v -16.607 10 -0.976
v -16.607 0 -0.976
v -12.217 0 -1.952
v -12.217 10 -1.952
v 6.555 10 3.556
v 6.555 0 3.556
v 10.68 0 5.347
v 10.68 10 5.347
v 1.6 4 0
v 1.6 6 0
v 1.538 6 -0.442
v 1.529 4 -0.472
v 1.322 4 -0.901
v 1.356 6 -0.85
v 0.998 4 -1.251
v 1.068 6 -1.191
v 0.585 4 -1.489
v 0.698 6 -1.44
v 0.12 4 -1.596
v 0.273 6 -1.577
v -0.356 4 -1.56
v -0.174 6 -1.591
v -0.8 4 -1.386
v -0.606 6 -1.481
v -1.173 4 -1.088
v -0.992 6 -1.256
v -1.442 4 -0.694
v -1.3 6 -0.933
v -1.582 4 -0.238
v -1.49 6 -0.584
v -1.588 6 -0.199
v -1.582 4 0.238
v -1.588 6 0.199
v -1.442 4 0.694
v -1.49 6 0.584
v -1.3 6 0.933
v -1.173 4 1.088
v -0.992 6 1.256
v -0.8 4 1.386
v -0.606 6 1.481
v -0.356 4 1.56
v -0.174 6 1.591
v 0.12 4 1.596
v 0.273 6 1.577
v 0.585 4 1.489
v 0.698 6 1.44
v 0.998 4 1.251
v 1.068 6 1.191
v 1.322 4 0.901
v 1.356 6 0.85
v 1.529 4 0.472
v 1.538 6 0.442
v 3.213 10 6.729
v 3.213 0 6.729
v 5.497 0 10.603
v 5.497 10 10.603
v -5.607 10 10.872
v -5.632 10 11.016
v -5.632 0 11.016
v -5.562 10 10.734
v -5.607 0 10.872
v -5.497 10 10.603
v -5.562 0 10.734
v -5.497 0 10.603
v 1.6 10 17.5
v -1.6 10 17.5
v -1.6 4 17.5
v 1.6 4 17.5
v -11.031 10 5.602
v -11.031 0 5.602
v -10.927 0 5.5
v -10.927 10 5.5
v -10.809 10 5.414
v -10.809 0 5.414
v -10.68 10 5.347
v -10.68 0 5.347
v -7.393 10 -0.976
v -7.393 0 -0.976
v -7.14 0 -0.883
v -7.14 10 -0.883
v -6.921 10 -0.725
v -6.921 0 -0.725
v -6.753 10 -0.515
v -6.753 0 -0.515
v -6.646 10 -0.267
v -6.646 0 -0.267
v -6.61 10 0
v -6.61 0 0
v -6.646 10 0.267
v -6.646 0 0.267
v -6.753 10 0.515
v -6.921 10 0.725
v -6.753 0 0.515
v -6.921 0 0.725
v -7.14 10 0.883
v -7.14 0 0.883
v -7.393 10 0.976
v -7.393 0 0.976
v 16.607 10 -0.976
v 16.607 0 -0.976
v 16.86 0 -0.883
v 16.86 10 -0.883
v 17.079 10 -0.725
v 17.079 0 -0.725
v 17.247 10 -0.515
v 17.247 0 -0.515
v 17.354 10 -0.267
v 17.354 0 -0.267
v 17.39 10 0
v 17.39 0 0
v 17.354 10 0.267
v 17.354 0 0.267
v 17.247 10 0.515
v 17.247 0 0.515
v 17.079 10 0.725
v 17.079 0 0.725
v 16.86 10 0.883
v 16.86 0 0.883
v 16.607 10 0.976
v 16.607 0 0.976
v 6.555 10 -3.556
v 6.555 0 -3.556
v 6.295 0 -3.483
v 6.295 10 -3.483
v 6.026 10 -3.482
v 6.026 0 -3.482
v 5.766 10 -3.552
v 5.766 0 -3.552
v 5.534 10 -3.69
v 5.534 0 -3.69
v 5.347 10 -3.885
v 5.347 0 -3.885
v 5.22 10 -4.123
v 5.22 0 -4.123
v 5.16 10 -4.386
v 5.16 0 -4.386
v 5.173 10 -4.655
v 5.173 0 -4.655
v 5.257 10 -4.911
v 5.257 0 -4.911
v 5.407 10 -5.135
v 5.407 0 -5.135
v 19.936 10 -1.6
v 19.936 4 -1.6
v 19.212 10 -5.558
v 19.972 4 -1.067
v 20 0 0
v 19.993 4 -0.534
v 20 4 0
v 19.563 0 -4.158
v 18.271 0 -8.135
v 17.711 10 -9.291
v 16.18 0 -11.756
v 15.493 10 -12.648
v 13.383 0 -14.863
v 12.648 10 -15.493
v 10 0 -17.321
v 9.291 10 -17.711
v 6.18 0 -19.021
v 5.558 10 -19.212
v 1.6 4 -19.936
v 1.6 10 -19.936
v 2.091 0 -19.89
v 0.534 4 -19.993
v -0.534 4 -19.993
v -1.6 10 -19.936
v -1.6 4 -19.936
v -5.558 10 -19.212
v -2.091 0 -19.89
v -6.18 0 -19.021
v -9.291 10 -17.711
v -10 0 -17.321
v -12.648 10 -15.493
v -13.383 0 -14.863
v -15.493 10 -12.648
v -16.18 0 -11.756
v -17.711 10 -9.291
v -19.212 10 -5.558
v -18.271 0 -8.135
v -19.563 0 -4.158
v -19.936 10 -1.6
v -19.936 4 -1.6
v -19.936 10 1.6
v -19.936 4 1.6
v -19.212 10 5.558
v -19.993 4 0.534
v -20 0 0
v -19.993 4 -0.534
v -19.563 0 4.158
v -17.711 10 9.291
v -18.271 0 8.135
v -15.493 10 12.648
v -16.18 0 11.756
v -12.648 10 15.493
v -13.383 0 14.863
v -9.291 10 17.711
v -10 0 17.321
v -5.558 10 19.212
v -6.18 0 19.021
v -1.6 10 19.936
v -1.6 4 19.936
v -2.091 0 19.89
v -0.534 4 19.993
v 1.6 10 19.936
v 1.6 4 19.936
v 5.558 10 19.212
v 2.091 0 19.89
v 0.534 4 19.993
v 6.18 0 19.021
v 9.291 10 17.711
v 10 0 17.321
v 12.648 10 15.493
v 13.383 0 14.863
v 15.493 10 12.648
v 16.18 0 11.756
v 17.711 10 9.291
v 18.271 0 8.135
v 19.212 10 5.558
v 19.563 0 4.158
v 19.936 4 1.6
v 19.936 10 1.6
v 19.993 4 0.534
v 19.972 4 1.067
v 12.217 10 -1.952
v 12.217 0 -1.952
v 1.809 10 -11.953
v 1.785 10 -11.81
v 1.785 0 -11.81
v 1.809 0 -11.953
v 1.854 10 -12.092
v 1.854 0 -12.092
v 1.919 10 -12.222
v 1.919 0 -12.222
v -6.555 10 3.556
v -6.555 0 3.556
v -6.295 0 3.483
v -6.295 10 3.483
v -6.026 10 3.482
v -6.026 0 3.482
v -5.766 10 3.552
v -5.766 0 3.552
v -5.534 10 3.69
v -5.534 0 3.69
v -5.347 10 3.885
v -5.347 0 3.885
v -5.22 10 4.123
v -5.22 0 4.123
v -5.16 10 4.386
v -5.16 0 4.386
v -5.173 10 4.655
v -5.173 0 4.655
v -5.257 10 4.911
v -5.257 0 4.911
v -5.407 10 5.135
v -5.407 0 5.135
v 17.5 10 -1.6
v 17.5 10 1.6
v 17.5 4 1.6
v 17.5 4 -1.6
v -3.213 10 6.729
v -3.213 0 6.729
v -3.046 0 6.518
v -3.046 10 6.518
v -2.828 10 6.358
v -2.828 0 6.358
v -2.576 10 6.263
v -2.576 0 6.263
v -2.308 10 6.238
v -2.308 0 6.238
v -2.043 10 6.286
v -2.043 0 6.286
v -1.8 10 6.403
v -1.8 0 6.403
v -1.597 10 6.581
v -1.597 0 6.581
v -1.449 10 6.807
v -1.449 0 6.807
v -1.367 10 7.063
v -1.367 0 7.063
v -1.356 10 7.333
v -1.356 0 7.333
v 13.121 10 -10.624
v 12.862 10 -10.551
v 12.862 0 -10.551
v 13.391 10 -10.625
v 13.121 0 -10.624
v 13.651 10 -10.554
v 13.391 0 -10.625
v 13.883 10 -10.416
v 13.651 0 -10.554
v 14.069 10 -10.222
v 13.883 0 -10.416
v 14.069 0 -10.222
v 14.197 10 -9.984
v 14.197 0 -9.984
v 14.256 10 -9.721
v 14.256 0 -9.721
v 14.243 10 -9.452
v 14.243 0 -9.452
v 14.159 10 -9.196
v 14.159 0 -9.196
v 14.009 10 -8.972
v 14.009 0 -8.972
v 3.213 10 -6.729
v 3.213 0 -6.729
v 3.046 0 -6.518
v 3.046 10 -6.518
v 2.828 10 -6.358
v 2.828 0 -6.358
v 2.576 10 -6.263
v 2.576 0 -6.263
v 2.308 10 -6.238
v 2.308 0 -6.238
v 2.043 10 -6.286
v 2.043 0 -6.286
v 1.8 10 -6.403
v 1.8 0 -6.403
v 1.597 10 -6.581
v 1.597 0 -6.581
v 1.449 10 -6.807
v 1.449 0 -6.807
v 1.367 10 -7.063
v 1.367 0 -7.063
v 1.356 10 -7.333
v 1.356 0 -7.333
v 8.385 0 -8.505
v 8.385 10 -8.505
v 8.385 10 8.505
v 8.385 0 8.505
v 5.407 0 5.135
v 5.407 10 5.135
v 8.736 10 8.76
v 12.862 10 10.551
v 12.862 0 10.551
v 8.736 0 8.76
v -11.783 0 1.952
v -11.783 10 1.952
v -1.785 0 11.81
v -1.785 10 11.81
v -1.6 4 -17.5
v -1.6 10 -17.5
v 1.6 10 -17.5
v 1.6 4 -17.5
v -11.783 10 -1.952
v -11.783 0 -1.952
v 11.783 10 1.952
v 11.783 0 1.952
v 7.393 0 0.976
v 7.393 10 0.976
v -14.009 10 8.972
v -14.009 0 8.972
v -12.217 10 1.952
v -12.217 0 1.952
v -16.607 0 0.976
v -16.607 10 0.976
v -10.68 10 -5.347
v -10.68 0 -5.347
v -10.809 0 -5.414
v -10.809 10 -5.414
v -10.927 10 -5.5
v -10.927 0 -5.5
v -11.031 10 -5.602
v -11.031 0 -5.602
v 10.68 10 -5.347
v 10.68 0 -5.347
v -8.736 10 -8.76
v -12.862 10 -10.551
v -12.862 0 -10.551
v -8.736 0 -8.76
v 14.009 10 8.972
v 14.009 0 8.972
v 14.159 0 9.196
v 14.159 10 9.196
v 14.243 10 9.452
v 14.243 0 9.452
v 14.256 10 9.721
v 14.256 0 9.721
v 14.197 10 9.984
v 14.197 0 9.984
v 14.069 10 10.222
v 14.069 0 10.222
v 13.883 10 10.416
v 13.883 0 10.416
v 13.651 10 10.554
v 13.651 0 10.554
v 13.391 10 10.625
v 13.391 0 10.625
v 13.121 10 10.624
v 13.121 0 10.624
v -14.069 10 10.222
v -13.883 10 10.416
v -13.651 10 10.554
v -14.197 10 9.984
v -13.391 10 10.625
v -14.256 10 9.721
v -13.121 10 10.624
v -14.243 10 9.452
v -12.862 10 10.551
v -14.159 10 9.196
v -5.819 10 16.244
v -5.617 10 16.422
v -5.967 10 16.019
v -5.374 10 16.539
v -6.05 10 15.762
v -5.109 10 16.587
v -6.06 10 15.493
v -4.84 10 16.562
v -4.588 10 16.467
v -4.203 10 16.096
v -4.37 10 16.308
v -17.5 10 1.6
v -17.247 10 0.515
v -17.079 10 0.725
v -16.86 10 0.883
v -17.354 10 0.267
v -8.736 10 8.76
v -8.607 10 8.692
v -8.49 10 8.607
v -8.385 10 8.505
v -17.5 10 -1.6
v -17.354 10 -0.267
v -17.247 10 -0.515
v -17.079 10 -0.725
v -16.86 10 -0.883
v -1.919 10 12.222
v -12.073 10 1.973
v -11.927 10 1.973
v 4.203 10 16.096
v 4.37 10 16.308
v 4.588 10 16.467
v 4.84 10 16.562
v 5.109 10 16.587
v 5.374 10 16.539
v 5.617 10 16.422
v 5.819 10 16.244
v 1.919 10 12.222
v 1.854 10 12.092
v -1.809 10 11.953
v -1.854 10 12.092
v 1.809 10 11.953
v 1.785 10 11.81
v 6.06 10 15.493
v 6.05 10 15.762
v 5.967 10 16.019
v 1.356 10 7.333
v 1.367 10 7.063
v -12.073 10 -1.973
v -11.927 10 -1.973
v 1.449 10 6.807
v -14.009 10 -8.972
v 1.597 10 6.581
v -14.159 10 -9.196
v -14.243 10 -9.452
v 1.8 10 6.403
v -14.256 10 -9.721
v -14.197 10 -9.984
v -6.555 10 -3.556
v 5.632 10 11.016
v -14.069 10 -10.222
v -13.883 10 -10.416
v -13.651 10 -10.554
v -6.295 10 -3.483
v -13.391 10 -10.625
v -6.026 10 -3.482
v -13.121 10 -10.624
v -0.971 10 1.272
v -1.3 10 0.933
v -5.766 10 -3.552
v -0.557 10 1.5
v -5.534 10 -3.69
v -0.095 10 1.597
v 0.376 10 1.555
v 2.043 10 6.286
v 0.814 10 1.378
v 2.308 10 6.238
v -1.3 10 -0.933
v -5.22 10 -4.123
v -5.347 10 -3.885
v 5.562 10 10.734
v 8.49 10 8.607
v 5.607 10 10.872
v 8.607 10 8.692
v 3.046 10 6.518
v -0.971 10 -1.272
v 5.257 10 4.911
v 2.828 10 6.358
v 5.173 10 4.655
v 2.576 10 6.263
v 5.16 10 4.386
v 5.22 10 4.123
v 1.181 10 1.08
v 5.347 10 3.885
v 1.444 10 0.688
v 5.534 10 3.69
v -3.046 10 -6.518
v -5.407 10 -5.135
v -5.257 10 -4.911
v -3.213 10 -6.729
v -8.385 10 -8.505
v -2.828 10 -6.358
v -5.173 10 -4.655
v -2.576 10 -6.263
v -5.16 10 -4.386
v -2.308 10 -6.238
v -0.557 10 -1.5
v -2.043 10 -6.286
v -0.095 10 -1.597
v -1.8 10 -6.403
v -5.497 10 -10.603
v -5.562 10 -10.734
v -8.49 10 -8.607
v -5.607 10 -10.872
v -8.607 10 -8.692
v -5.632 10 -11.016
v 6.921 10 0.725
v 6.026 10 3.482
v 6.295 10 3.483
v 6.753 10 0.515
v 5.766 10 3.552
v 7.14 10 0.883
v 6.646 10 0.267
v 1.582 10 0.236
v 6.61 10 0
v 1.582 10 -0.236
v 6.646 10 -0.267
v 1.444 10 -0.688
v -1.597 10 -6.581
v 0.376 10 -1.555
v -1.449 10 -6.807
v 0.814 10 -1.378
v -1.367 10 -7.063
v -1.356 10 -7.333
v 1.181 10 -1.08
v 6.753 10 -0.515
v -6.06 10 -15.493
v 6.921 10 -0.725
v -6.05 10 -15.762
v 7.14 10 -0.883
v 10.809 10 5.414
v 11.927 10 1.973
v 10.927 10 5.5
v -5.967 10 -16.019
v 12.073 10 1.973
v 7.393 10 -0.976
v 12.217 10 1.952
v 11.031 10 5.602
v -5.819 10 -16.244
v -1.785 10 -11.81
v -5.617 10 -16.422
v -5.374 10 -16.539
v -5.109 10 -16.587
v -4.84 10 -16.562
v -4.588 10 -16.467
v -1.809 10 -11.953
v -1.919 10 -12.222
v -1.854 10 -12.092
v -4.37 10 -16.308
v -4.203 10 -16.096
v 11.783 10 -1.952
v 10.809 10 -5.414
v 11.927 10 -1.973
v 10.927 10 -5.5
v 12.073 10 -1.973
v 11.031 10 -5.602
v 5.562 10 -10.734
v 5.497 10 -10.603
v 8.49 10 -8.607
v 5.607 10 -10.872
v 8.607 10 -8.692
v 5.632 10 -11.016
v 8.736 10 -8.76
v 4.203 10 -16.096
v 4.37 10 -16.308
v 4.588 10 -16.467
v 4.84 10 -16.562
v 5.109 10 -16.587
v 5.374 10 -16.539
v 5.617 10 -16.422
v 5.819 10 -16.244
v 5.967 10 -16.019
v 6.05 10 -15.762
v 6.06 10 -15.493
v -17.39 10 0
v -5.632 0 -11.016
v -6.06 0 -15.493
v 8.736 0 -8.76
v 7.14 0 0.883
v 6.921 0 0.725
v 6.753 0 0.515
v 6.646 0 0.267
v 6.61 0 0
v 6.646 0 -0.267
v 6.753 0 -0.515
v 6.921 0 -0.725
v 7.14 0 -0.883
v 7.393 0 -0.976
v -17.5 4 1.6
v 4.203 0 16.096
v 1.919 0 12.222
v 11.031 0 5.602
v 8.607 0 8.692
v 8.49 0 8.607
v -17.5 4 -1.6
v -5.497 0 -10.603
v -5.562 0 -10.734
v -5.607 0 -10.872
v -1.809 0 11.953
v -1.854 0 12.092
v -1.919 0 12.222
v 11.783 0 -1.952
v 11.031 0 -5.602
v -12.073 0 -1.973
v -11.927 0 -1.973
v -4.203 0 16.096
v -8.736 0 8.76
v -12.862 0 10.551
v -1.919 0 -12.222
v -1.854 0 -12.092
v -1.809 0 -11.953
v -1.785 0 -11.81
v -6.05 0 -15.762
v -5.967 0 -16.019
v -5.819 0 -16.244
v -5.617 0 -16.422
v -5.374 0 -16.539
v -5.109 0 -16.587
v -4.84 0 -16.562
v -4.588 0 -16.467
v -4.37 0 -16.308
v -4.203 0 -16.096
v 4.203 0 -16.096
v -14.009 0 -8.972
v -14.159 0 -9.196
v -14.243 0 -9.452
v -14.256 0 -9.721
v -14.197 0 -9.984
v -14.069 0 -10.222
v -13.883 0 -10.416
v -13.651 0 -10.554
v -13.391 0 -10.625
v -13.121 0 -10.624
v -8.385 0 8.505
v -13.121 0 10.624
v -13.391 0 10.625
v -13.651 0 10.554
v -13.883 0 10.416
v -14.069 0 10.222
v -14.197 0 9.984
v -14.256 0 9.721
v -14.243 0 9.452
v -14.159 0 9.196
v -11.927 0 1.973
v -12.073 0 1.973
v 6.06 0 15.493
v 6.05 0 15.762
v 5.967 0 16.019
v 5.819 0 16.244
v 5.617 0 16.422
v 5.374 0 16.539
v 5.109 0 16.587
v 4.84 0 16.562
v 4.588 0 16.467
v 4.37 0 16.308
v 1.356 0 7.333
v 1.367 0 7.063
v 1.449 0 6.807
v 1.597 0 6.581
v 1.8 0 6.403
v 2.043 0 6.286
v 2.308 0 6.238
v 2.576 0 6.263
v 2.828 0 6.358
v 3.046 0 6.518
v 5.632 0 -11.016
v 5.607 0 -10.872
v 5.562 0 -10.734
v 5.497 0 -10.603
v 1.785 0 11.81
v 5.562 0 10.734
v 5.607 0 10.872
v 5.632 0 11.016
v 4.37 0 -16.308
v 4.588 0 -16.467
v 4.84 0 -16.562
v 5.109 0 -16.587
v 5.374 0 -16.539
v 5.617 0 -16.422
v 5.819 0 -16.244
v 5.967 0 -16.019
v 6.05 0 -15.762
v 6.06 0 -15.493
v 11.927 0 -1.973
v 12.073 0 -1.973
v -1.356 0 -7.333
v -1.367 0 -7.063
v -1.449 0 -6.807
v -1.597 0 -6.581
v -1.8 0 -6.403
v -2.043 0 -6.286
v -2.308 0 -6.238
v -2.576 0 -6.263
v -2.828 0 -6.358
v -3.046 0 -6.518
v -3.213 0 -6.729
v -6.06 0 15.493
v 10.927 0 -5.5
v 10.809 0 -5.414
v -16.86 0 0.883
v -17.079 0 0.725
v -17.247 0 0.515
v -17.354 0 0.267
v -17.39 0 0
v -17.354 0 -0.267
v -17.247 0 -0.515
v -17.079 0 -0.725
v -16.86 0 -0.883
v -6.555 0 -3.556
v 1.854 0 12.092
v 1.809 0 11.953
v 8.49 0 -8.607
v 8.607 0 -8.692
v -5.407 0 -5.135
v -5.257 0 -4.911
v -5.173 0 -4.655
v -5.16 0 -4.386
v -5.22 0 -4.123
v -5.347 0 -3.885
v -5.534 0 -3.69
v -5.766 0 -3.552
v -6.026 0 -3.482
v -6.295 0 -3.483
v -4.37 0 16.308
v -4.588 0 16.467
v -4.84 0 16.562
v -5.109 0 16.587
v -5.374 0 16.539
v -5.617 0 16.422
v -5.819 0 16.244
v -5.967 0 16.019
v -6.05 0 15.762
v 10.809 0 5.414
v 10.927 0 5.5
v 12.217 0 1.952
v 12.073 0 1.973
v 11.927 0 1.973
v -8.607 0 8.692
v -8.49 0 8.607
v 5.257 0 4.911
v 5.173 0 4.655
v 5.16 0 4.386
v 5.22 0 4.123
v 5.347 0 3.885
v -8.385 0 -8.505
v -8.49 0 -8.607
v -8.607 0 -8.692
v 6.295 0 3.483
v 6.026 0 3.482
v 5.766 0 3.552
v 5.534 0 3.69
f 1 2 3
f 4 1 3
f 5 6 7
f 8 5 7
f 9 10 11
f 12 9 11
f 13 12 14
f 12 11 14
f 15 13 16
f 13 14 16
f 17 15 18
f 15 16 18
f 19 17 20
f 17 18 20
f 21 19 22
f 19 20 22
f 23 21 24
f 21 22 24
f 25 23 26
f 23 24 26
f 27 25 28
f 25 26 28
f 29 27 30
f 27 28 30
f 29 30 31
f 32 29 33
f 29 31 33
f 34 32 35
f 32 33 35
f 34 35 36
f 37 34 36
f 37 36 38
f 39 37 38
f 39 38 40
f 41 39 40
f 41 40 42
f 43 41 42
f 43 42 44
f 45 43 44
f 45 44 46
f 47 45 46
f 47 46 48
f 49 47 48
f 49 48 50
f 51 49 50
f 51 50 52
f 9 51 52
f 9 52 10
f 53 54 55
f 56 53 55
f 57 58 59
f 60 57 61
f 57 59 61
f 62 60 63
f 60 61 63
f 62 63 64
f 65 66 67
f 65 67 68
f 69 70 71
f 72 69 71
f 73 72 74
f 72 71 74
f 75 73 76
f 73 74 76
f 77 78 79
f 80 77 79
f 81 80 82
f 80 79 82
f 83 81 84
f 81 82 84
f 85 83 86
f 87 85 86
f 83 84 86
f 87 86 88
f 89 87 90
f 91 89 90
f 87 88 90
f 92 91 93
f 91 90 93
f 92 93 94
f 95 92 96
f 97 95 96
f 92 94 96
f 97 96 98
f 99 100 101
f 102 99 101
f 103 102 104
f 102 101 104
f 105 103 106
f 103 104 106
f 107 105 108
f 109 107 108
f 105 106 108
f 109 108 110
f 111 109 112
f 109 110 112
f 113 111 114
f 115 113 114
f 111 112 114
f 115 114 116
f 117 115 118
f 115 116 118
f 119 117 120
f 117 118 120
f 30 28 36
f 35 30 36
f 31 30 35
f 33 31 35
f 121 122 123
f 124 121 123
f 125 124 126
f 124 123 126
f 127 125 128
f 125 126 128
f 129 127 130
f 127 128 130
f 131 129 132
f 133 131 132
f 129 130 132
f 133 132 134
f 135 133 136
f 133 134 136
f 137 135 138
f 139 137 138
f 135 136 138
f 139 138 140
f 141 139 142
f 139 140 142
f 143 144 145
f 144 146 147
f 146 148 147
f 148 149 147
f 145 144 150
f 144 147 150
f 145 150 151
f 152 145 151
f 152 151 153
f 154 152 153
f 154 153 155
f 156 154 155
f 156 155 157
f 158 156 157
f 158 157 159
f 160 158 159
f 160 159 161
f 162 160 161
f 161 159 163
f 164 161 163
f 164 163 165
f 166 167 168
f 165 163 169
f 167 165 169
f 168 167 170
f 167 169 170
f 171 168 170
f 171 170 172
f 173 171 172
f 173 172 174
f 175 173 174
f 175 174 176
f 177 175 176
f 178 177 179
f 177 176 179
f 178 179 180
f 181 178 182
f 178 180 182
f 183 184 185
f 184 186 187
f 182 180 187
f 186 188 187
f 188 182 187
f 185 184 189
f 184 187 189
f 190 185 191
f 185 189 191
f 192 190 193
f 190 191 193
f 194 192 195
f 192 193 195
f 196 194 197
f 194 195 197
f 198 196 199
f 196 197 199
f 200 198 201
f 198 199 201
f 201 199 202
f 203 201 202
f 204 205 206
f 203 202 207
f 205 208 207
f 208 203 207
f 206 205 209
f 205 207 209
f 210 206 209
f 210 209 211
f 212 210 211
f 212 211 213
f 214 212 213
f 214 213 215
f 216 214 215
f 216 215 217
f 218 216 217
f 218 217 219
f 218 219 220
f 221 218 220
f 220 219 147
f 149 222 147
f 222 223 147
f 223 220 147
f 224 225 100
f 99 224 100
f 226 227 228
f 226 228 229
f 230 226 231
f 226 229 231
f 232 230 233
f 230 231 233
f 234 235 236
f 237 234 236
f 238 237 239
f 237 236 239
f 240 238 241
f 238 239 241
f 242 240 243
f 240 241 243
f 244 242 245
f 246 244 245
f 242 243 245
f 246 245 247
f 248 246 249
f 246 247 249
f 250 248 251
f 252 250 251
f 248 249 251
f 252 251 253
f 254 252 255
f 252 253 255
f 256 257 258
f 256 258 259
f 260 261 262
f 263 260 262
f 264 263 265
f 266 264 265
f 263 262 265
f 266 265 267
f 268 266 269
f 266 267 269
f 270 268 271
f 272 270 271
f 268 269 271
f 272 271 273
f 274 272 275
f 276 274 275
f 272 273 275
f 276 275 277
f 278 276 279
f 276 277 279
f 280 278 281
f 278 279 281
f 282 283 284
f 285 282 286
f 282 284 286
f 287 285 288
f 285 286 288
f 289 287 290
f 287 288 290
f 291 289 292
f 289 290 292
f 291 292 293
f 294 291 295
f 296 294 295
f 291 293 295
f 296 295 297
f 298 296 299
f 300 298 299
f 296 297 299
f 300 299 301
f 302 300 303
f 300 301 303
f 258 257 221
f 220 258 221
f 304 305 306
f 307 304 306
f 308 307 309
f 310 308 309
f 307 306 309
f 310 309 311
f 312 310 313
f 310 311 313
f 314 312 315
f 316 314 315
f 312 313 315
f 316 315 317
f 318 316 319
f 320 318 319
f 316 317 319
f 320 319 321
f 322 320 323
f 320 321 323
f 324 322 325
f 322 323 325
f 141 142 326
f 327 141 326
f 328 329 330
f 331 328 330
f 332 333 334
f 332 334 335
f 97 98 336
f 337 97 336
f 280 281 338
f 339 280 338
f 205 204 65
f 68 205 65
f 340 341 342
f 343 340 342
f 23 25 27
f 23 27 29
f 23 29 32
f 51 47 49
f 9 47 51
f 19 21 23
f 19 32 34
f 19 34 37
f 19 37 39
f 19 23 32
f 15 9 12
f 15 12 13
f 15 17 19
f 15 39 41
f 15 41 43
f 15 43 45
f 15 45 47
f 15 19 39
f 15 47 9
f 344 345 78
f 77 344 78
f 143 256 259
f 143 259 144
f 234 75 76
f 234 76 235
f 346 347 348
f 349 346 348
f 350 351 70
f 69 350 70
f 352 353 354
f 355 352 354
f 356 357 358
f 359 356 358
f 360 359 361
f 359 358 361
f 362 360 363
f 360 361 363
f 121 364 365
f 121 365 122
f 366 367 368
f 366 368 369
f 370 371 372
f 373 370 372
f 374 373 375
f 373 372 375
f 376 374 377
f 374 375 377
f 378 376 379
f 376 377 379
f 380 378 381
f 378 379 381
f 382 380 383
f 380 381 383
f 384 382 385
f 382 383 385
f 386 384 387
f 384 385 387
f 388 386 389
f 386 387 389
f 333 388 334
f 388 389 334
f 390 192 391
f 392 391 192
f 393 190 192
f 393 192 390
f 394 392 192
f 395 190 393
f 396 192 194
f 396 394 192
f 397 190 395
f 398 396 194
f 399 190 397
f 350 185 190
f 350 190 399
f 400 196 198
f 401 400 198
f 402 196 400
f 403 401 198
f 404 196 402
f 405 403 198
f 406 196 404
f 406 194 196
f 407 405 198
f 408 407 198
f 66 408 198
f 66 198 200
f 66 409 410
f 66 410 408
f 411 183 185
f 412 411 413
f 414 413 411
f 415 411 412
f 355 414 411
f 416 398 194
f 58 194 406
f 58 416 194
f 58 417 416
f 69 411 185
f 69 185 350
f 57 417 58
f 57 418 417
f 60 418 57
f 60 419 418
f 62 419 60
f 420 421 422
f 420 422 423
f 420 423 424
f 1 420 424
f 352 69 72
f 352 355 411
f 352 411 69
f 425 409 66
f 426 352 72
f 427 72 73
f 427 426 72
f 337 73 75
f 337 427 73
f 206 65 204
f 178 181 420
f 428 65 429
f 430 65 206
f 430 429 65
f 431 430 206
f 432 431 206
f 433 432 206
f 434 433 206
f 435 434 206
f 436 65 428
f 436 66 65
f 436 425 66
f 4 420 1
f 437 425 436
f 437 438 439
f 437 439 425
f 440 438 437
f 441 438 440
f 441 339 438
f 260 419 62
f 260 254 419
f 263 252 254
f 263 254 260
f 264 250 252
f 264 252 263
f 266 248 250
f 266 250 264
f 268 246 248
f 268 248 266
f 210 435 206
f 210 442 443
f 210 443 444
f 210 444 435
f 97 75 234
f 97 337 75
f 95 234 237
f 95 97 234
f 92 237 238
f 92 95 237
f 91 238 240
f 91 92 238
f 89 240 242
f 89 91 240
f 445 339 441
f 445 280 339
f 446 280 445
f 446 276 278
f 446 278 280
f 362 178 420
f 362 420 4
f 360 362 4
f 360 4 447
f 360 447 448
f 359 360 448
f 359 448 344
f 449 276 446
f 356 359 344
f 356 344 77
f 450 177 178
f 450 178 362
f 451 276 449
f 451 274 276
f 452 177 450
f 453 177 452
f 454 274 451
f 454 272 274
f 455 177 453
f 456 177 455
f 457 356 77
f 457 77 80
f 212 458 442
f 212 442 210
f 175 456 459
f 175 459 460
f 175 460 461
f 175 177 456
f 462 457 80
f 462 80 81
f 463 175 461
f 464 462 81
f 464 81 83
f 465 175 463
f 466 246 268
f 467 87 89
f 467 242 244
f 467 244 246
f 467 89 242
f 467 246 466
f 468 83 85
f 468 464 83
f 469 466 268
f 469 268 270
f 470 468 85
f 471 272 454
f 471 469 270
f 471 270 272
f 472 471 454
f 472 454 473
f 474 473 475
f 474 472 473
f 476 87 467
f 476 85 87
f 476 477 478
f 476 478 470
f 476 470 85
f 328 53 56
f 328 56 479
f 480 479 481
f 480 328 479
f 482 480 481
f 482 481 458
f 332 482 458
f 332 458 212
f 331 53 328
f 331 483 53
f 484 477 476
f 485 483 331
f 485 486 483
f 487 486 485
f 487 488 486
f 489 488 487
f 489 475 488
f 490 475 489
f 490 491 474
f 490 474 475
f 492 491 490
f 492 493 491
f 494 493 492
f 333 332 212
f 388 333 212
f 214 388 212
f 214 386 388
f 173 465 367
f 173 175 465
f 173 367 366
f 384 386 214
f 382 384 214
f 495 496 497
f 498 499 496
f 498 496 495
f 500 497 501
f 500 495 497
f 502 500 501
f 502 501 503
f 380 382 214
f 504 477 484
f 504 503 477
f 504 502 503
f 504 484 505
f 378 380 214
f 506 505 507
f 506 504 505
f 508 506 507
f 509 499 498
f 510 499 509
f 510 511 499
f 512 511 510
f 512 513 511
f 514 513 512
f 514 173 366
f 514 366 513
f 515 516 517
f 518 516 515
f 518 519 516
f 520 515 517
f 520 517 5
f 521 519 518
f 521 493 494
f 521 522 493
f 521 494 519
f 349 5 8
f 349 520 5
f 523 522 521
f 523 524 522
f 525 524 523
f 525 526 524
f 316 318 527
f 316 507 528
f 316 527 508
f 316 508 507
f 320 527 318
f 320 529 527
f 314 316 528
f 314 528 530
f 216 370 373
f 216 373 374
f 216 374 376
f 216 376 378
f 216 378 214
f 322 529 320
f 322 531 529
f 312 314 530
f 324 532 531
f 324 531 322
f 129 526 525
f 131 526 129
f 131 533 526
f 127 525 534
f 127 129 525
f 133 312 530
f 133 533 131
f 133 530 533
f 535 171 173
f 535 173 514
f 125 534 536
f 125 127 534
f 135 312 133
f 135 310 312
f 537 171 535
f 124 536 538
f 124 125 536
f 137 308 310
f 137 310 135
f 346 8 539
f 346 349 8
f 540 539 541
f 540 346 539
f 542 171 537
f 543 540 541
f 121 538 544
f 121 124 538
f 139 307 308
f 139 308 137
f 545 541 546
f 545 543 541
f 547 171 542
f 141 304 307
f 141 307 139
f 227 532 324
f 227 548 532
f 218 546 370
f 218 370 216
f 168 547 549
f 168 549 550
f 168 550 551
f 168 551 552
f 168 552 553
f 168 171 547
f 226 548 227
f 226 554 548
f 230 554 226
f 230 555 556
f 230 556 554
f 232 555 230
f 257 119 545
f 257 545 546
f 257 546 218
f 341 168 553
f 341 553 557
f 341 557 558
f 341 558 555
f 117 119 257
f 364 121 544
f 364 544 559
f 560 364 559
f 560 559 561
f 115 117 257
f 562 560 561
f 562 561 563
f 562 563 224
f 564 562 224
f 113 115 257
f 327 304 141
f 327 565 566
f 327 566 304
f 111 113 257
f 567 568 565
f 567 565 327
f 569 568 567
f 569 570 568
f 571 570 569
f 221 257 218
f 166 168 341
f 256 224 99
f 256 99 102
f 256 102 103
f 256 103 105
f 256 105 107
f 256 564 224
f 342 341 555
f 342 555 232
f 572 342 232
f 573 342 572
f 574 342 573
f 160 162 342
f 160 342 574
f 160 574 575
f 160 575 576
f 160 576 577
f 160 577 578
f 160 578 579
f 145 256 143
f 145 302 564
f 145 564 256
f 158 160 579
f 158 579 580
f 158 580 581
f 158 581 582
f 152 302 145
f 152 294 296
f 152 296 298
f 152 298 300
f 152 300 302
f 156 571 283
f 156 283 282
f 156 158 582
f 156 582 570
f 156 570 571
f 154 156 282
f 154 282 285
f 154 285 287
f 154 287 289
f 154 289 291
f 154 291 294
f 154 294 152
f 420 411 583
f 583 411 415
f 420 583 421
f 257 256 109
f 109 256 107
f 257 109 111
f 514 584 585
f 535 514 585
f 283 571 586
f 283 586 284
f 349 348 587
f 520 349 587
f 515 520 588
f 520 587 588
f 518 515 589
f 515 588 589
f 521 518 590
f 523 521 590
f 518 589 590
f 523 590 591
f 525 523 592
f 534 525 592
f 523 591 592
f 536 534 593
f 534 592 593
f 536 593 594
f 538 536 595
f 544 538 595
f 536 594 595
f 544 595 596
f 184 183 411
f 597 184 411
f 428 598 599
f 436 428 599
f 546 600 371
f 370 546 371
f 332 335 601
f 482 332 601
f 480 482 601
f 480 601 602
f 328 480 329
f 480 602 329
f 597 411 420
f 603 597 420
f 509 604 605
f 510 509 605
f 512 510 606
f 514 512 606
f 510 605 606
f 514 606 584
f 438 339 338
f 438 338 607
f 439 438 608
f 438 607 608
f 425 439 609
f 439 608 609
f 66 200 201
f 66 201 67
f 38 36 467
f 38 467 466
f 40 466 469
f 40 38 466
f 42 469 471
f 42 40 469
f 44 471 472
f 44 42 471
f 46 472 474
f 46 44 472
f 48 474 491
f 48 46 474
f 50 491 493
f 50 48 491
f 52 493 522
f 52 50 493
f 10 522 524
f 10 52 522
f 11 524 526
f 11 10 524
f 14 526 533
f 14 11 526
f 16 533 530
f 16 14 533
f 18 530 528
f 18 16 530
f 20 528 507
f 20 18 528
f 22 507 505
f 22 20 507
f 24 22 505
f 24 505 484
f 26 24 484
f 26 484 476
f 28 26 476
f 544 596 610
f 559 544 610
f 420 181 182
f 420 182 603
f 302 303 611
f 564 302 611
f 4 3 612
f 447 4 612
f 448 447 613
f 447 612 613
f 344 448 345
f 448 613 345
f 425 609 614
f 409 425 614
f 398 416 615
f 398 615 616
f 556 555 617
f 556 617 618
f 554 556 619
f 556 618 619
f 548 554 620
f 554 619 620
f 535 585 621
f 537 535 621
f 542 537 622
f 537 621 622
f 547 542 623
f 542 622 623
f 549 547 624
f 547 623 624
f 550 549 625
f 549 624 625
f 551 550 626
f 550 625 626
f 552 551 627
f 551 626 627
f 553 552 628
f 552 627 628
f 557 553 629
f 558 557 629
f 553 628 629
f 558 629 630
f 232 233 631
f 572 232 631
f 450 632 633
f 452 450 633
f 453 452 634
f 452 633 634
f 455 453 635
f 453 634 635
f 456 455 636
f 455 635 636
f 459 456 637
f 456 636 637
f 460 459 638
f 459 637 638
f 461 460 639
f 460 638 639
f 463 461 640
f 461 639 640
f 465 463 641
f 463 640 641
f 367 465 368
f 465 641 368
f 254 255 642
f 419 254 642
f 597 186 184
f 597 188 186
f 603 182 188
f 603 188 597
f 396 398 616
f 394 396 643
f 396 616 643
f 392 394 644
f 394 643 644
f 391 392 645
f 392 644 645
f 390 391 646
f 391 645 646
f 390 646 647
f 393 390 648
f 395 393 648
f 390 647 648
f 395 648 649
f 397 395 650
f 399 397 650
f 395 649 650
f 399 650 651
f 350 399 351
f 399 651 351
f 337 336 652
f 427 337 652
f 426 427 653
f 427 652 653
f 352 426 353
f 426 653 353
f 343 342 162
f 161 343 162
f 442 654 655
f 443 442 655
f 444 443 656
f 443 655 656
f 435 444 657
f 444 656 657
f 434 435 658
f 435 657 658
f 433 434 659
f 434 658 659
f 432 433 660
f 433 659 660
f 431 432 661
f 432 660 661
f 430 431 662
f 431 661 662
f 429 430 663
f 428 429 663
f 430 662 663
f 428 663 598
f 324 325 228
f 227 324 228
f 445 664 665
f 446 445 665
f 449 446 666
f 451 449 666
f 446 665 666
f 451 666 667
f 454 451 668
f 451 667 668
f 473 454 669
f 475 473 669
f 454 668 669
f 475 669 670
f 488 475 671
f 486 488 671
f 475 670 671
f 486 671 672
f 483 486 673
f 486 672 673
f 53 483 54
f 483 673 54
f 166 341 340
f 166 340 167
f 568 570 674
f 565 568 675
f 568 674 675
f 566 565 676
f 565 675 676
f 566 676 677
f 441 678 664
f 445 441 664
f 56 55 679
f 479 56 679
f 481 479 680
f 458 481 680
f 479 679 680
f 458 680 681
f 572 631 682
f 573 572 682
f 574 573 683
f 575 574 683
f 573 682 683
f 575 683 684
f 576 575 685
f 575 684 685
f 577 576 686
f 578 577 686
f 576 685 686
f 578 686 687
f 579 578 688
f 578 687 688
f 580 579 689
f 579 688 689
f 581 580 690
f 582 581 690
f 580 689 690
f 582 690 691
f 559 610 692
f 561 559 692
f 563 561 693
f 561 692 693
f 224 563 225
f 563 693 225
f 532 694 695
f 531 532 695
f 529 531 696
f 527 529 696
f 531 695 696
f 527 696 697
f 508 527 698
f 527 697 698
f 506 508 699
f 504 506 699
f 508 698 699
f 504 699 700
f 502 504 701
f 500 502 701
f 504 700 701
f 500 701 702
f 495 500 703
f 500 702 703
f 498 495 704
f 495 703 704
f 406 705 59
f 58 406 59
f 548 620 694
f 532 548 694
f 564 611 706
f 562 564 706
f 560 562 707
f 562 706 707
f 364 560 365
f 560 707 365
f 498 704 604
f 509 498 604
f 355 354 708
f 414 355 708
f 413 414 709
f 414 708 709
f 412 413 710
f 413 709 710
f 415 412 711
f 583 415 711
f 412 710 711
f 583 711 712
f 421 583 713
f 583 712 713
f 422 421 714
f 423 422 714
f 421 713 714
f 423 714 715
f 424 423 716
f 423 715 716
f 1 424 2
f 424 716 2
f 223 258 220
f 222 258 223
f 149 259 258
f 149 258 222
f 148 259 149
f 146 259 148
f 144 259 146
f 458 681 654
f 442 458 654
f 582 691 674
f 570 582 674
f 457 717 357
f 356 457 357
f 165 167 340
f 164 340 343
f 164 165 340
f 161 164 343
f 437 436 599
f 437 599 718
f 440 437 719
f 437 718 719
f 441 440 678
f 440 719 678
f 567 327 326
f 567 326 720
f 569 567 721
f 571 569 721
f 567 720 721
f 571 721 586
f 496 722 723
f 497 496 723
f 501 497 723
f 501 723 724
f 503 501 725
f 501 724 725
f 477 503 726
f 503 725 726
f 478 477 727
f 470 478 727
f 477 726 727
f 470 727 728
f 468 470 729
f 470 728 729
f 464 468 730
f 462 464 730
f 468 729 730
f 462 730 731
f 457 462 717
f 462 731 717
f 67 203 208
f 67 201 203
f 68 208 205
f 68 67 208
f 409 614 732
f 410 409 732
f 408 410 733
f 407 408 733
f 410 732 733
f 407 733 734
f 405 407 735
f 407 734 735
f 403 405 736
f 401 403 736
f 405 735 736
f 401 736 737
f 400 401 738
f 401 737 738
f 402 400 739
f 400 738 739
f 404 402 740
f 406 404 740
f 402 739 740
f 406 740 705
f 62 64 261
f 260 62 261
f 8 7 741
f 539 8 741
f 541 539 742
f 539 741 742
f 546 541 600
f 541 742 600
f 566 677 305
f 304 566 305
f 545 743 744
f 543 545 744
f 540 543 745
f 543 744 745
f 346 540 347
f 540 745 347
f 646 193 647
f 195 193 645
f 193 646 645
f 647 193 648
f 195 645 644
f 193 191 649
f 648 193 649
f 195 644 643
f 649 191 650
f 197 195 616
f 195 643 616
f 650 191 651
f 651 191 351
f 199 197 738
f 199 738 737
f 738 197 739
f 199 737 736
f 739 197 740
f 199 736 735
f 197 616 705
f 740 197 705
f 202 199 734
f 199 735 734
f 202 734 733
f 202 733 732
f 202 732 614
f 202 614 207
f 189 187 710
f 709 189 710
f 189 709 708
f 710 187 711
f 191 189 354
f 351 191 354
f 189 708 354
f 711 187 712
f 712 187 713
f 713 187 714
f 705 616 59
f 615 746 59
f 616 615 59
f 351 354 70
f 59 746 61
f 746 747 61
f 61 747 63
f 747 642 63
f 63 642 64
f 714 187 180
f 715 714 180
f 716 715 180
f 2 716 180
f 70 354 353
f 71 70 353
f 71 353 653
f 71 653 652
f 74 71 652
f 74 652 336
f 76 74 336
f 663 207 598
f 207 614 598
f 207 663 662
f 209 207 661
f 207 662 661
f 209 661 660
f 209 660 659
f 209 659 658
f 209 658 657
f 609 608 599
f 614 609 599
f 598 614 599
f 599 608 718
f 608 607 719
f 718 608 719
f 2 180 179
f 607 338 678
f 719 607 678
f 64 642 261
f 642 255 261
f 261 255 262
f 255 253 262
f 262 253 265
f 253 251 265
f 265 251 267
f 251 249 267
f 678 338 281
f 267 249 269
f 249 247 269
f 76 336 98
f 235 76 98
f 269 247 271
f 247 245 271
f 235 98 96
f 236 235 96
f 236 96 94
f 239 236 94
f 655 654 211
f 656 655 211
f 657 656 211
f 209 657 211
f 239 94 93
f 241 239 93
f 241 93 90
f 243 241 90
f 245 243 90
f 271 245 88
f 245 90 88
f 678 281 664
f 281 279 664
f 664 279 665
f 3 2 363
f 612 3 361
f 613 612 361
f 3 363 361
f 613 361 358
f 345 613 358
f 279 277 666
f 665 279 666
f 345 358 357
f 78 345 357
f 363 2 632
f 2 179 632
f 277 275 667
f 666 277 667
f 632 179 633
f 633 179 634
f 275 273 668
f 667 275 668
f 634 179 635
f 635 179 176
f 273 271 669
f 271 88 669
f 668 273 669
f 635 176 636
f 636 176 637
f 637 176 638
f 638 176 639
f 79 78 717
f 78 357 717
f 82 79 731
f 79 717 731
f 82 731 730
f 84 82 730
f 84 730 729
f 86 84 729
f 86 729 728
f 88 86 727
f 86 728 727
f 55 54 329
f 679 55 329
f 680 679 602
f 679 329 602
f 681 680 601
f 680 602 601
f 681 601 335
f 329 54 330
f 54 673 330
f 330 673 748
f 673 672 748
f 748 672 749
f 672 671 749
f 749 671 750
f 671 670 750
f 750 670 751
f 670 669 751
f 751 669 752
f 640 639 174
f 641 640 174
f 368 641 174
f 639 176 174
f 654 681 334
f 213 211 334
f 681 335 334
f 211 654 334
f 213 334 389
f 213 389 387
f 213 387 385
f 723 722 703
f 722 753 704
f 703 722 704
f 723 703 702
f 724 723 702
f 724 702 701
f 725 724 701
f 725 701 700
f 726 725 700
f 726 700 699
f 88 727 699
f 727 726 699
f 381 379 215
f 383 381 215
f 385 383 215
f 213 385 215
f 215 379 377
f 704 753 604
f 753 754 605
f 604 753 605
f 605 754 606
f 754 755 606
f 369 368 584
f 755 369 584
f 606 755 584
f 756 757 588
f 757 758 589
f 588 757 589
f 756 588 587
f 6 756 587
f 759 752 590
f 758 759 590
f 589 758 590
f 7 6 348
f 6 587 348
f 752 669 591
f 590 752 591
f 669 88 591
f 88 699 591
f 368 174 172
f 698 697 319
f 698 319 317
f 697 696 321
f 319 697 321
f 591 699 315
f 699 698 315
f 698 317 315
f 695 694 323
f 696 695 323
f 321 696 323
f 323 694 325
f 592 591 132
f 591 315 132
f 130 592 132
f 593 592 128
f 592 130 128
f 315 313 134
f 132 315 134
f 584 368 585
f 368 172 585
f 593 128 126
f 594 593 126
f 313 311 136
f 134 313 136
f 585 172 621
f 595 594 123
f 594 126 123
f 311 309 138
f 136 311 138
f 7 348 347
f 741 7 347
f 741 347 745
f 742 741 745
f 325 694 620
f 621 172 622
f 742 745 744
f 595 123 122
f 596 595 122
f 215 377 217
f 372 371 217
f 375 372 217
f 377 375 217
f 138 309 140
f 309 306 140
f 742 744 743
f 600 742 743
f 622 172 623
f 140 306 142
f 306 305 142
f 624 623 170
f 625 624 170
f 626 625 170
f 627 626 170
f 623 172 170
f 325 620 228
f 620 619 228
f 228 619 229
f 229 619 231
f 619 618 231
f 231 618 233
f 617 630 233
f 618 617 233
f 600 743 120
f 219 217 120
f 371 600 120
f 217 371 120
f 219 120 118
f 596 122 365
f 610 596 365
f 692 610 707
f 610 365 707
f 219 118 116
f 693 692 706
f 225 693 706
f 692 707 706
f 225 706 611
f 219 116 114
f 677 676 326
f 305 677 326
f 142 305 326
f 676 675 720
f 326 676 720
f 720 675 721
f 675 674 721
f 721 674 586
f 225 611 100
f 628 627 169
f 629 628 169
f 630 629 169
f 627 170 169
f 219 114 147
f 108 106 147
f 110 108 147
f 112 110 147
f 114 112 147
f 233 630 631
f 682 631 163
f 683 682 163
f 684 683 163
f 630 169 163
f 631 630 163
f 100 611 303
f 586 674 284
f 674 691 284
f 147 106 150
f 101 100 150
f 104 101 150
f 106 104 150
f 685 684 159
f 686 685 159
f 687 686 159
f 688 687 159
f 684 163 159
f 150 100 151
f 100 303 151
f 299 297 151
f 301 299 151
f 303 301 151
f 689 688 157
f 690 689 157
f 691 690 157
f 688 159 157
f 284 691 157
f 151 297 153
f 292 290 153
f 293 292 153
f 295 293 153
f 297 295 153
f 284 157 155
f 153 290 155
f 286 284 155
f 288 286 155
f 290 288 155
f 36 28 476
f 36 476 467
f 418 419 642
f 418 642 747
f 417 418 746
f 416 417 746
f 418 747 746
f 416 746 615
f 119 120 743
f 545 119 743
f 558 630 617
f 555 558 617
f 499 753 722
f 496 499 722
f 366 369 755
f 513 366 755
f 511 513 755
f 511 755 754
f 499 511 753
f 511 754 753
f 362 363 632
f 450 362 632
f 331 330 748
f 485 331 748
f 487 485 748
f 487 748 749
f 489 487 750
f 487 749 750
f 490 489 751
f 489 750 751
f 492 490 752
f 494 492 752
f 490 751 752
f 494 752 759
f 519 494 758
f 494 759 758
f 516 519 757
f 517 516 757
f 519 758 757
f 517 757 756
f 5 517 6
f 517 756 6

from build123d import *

# Parameters (mm, degrees)
SKETCH_1_R               = 20
SKETCH_1_R_2             = 4
EXTRUDE_1_DEPTH          = 10
SKETCH_4_R               = 20
EXTRUDE_2_DEPTH          = 6
SKETCH_5_R               = 1.6
CUT_EXTRUDE_2_DEPTH      = 5
CUT_EXTRUDE_2_DEPTH_BACK = 7
CUT_EXTRUDE_3_DEPTH      = 1
CUT_EXTRUDE_3_DEPTH_BACK = 11
SKETCH_8_W               = 3.2
SKETCH_8_H               = 5
SKETCH_8_W_2             = 5
SKETCH_8_H_2             = 3.2
CUT_EXTRUDE_4_DEPTH      = 6
SKETCH_9_R               = 3
CUT_EXTRUDE_5_DEPTH      = 2
SKETCH_11_R              = 4
EXTRUDE_3_DEPTH          = 4
SKETCH_12_R              = 3
EXTRUDE_4_DEPTH          = 2
SKETCH_13_R              = 1.6
EXTRUDE_5_DEPTH          = 2


with BuildPart() as part:
    # Эскиз1 → Бобышка-Вытянуть1 (new body)
    with BuildSketch(Plane(origin=(0, 0, 0), x_dir=(1, 0, 0), z_dir=(0, 1, 0))):
        Circle(SKETCH_1_R)
        Circle(SKETCH_1_R_2, mode=Mode.SUBTRACT)
    extrude(amount=EXTRUDE_1_DEPTH)

    # Эскиз4 → Бобышка-Вытянуть2 (add)
    with BuildSketch(Plane.XZ):
        Circle(SKETCH_4_R)
    extrude(amount=-EXTRUDE_2_DEPTH)

    # Эскиз5 → Вырез-Вытянуть2 (cut, two sides)
    with BuildSketch(Plane(origin=(0, 6, 0), x_dir=(1, 0, 0), z_dir=(0, 1, 0))) as cut_extrude_2_sk:
        Circle(SKETCH_5_R)
    extrude(amount=CUT_EXTRUDE_2_DEPTH, mode=Mode.SUBTRACT)
    extrude(cut_extrude_2_sk.sketch, amount=-CUT_EXTRUDE_2_DEPTH_BACK, mode=Mode.SUBTRACT)

    # Эскиз6 → Вырез-Вытянуть3 (cut, two sides)
    with BuildSketch(Plane.XZ) as cut_extrude_3_sk:
        with BuildLine():
            Line((-7.392842, 0.976187), (-11.78307, 1.951793))
            ThreePointArc((-11.78307, 1.951793), (-12, 1.975606), (-12.21693, 1.951793))
            Line((-12.21693, 1.951793), (-16.607158, 0.976187))
            ThreePointArc((-16.607158, 0.976187), (-17.390228, 0), (-16.607158, -0.976187))
            Line((-16.607158, -0.976187), (-12.21693, -1.951793))
            ThreePointArc((-12.21693, -1.951793), (-12, -1.975606), (-11.78307, -1.951793))
            Line((-11.78307, -1.951793), (-7.392842, -0.976187))
            ThreePointArc((-7.392842, -0.976187), (-6.609772, 0), (-7.392842, 0.976187))
        make_face()
        with BuildLine():
            Line((-5.407146, 5.135155), (-8.385468, 8.504948))
            ThreePointArc((-8.385468, 8.504948), (-8.546972, 8.651722), (-8.736469, 8.759965))
            Line((-8.736469, 8.759965), (-12.861685, 10.551195))
            ThreePointArc((-12.861685, 10.551195), (-14.06899, 10.221719), (-14.009262, 8.971691))
            Line((-14.009262, 8.971691), (-11.03094, 5.601898))
            ThreePointArc((-11.03094, 5.601898), (-10.869436, 5.455124), (-10.679939, 5.346881))
            Line((-10.679939, 5.346881), (-6.554723, 3.555651))
            ThreePointArc((-6.554723, 3.555651), (-5.347418, 3.885127), (-5.407146, 5.135155))
        make_face()
        with BuildLine():
            Line((-1.356105, 7.332669), (-1.784903, 11.809502))
            ThreePointArc((-1.784903, 11.809502), (-1.829291, 12.023174), (-1.918973, 12.222129))
            Line((-1.918973, 12.222129), (-4.203485, 16.096004))
            ThreePointArc((-4.203485, 16.096004), (-5.373876, 16.539089), (-6.060303, 15.492688))
            Line((-6.060303, 15.492688), (-5.631505, 11.015854))
            ThreePointArc((-5.631505, 11.015854), (-5.587117, 10.802182), (-5.497434, 10.603228))
            Line((-5.497434, 10.603228), (-3.212923, 6.729352))
            ThreePointArc((-3.212923, 6.729352), (-2.042532, 6.286267), (-1.356105, 7.332669))
        make_face()
        with BuildLine():
            Line((3.212923, 6.729352), (5.497434, 10.603228))
            ThreePointArc((5.497434, 10.603228), (5.587117, 10.802182), (5.631505, 11.015854))
            Line((5.631505, 11.015854), (6.060303, 15.492688))
            ThreePointArc((6.060303, 15.492688), (5.373876, 16.539089), (4.203485, 16.096004))
            Line((4.203485, 16.096004), (1.918973, 12.222129))
            ThreePointArc((1.918973, 12.222129), (1.829291, 12.023174), (1.784903, 11.809502))
            Line((1.784903, 11.809502), (1.356105, 7.332669))
            ThreePointArc((1.356105, 7.332669), (2.042532, 6.286267), (3.212923, 6.729352))
        make_face()
        with BuildLine():
            Line((6.554723, 3.555651), (10.679939, 5.346881))
            ThreePointArc((10.679939, 5.346881), (10.869436, 5.455124), (11.03094, 5.601898))
            Line((11.03094, 5.601898), (14.009262, 8.971691))
            ThreePointArc((14.009262, 8.971691), (14.06899, 10.221719), (12.861685, 10.551195))
            Line((12.861685, 10.551195), (8.736469, 8.759965))
            ThreePointArc((8.736469, 8.759965), (8.546972, 8.651722), (8.385468, 8.504948))
            Line((8.385468, 8.504948), (5.407146, 5.135155))
            ThreePointArc((5.407146, 5.135155), (5.347418, 3.885127), (6.554723, 3.555651))
        make_face()
        with BuildLine():
            Line((7.392842, -0.976187), (11.78307, -1.951793))
            ThreePointArc((11.78307, -1.951793), (12, -1.975606), (12.21693, -1.951793))
            Line((12.21693, -1.951793), (16.607158, -0.976187))
            ThreePointArc((16.607158, -0.976187), (17.390228, 0), (16.607158, 0.976187))
            Line((16.607158, 0.976187), (12.21693, 1.951793))
            ThreePointArc((12.21693, 1.951793), (12, 1.975606), (11.78307, 1.951793))
            Line((11.78307, 1.951793), (7.392842, 0.976187))
            ThreePointArc((7.392842, 0.976187), (6.609772, 0), (7.392842, -0.976187))
        make_face()
        with BuildLine():
            Line((5.407146, -5.135155), (8.385468, -8.504948))
            ThreePointArc((8.385468, -8.504948), (8.546972, -8.651722), (8.736469, -8.759965))
            Line((8.736469, -8.759965), (12.861685, -10.551195))
            ThreePointArc((12.861685, -10.551195), (14.06899, -10.221719), (14.009262, -8.971691))
            Line((14.009262, -8.971691), (11.03094, -5.601898))
            ThreePointArc((11.03094, -5.601898), (10.869436, -5.455124), (10.679939, -5.346881))
            Line((10.679939, -5.346881), (6.554723, -3.555651))
            ThreePointArc((6.554723, -3.555651), (5.347418, -3.885127), (5.407146, -5.135155))
        make_face()
        with BuildLine():
            Line((1.356105, -7.332669), (1.784903, -11.809502))
            ThreePointArc((1.784903, -11.809502), (1.829291, -12.023174), (1.918973, -12.222129))
            Line((1.918973, -12.222129), (4.203485, -16.096004))
            ThreePointArc((4.203485, -16.096004), (5.373876, -16.539089), (6.060303, -15.492688))
            Line((6.060303, -15.492688), (5.631505, -11.015854))
            ThreePointArc((5.631505, -11.015854), (5.587117, -10.802182), (5.497434, -10.603228))
            Line((5.497434, -10.603228), (3.212923, -6.729352))
            ThreePointArc((3.212923, -6.729352), (2.042532, -6.286267), (1.356105, -7.332669))
        make_face()
        with BuildLine():
            Line((-3.212923, -6.729352), (-5.497434, -10.603228))
            ThreePointArc((-5.497434, -10.603228), (-5.587117, -10.802182), (-5.631505, -11.015854))
            Line((-5.631505, -11.015854), (-6.060303, -15.492688))
            ThreePointArc((-6.060303, -15.492688), (-5.373876, -16.539089), (-4.203485, -16.096004))
            Line((-4.203485, -16.096004), (-1.918973, -12.222129))
            ThreePointArc((-1.918973, -12.222129), (-1.829291, -12.023174), (-1.784903, -11.809502))
            Line((-1.784903, -11.809502), (-1.356105, -7.332669))
            ThreePointArc((-1.356105, -7.332669), (-2.042532, -6.286267), (-3.212923, -6.729352))
        make_face()
        with BuildLine():
            Line((-6.554723, -3.555651), (-10.679939, -5.346881))
            ThreePointArc((-10.679939, -5.346881), (-10.869436, -5.455124), (-11.03094, -5.601898))
            Line((-11.03094, -5.601898), (-14.009262, -8.971691))
            ThreePointArc((-14.009262, -8.971691), (-14.06899, -10.221719), (-12.861685, -10.551195))
            Line((-12.861685, -10.551195), (-8.736469, -8.759965))
            ThreePointArc((-8.736469, -8.759965), (-8.546972, -8.651722), (-8.385468, -8.504948))
            Line((-8.385468, -8.504948), (-5.407146, -5.135155))
            ThreePointArc((-5.407146, -5.135155), (-5.347418, -3.885127), (-6.554723, -3.555651))
        make_face()
    extrude(amount=CUT_EXTRUDE_3_DEPTH, mode=Mode.SUBTRACT)
    extrude(cut_extrude_3_sk.sketch, amount=-CUT_EXTRUDE_3_DEPTH_BACK, mode=Mode.SUBTRACT)

    # Эскиз8 → Вырез-Вытянуть4 (cut)
    with BuildSketch(Plane(origin=(0, 10, 0), x_dir=(1, 0, 0), z_dir=(0, 1, 0))):
        with Locations((0, 20)):
            Rectangle(SKETCH_8_W, SKETCH_8_H)
        with Locations((-20, 0)):
            Rectangle(SKETCH_8_W_2, SKETCH_8_H_2)
        with Locations((20, 0)):
            Rectangle(SKETCH_8_W_2, SKETCH_8_H_2)
        with Locations((0, -20)):
            Rectangle(SKETCH_8_W, SKETCH_8_H)
    extrude(amount=-CUT_EXTRUDE_4_DEPTH, mode=Mode.SUBTRACT)

    # Эскиз9 → Вырез-Вытянуть5 (cut)
    with BuildSketch(Plane.XZ):
        Circle(SKETCH_9_R)
    extrude(amount=-CUT_EXTRUDE_5_DEPTH, mode=Mode.SUBTRACT)

    # Эскиз11 → Бобышка-Вытянуть3 (add)
    with BuildSketch(Plane(origin=(0, 6, 0), x_dir=(1, 0, 0), z_dir=(0, 1, 0))):
        Circle(SKETCH_11_R)
        with BuildLine():
            Line((-1.3, 0.932738), (-1.3, -0.932738))
            ThreePointArc((-1.3, -0.932738), (1.6, 0), (-1.3, 0.932738))
        make_face(mode=Mode.SUBTRACT)
    extrude(amount=EXTRUDE_3_DEPTH)

    # Эскиз12 → Бобышка-Вытянуть4 (add)
    with BuildSketch(Plane.XZ.offset(-2)):
        Circle(SKETCH_12_R)
    extrude(amount=EXTRUDE_4_DEPTH)

    # Эскиз13 → Бобышка-Вытянуть5 (add)
    with BuildSketch(Plane(origin=(0, 2, 0), x_dir=(1, 0, 0), z_dir=(0, 1, 0))):
        Circle(SKETCH_13_R)
    extrude(amount=EXTRUDE_5_DEPTH)


solid = part.part
